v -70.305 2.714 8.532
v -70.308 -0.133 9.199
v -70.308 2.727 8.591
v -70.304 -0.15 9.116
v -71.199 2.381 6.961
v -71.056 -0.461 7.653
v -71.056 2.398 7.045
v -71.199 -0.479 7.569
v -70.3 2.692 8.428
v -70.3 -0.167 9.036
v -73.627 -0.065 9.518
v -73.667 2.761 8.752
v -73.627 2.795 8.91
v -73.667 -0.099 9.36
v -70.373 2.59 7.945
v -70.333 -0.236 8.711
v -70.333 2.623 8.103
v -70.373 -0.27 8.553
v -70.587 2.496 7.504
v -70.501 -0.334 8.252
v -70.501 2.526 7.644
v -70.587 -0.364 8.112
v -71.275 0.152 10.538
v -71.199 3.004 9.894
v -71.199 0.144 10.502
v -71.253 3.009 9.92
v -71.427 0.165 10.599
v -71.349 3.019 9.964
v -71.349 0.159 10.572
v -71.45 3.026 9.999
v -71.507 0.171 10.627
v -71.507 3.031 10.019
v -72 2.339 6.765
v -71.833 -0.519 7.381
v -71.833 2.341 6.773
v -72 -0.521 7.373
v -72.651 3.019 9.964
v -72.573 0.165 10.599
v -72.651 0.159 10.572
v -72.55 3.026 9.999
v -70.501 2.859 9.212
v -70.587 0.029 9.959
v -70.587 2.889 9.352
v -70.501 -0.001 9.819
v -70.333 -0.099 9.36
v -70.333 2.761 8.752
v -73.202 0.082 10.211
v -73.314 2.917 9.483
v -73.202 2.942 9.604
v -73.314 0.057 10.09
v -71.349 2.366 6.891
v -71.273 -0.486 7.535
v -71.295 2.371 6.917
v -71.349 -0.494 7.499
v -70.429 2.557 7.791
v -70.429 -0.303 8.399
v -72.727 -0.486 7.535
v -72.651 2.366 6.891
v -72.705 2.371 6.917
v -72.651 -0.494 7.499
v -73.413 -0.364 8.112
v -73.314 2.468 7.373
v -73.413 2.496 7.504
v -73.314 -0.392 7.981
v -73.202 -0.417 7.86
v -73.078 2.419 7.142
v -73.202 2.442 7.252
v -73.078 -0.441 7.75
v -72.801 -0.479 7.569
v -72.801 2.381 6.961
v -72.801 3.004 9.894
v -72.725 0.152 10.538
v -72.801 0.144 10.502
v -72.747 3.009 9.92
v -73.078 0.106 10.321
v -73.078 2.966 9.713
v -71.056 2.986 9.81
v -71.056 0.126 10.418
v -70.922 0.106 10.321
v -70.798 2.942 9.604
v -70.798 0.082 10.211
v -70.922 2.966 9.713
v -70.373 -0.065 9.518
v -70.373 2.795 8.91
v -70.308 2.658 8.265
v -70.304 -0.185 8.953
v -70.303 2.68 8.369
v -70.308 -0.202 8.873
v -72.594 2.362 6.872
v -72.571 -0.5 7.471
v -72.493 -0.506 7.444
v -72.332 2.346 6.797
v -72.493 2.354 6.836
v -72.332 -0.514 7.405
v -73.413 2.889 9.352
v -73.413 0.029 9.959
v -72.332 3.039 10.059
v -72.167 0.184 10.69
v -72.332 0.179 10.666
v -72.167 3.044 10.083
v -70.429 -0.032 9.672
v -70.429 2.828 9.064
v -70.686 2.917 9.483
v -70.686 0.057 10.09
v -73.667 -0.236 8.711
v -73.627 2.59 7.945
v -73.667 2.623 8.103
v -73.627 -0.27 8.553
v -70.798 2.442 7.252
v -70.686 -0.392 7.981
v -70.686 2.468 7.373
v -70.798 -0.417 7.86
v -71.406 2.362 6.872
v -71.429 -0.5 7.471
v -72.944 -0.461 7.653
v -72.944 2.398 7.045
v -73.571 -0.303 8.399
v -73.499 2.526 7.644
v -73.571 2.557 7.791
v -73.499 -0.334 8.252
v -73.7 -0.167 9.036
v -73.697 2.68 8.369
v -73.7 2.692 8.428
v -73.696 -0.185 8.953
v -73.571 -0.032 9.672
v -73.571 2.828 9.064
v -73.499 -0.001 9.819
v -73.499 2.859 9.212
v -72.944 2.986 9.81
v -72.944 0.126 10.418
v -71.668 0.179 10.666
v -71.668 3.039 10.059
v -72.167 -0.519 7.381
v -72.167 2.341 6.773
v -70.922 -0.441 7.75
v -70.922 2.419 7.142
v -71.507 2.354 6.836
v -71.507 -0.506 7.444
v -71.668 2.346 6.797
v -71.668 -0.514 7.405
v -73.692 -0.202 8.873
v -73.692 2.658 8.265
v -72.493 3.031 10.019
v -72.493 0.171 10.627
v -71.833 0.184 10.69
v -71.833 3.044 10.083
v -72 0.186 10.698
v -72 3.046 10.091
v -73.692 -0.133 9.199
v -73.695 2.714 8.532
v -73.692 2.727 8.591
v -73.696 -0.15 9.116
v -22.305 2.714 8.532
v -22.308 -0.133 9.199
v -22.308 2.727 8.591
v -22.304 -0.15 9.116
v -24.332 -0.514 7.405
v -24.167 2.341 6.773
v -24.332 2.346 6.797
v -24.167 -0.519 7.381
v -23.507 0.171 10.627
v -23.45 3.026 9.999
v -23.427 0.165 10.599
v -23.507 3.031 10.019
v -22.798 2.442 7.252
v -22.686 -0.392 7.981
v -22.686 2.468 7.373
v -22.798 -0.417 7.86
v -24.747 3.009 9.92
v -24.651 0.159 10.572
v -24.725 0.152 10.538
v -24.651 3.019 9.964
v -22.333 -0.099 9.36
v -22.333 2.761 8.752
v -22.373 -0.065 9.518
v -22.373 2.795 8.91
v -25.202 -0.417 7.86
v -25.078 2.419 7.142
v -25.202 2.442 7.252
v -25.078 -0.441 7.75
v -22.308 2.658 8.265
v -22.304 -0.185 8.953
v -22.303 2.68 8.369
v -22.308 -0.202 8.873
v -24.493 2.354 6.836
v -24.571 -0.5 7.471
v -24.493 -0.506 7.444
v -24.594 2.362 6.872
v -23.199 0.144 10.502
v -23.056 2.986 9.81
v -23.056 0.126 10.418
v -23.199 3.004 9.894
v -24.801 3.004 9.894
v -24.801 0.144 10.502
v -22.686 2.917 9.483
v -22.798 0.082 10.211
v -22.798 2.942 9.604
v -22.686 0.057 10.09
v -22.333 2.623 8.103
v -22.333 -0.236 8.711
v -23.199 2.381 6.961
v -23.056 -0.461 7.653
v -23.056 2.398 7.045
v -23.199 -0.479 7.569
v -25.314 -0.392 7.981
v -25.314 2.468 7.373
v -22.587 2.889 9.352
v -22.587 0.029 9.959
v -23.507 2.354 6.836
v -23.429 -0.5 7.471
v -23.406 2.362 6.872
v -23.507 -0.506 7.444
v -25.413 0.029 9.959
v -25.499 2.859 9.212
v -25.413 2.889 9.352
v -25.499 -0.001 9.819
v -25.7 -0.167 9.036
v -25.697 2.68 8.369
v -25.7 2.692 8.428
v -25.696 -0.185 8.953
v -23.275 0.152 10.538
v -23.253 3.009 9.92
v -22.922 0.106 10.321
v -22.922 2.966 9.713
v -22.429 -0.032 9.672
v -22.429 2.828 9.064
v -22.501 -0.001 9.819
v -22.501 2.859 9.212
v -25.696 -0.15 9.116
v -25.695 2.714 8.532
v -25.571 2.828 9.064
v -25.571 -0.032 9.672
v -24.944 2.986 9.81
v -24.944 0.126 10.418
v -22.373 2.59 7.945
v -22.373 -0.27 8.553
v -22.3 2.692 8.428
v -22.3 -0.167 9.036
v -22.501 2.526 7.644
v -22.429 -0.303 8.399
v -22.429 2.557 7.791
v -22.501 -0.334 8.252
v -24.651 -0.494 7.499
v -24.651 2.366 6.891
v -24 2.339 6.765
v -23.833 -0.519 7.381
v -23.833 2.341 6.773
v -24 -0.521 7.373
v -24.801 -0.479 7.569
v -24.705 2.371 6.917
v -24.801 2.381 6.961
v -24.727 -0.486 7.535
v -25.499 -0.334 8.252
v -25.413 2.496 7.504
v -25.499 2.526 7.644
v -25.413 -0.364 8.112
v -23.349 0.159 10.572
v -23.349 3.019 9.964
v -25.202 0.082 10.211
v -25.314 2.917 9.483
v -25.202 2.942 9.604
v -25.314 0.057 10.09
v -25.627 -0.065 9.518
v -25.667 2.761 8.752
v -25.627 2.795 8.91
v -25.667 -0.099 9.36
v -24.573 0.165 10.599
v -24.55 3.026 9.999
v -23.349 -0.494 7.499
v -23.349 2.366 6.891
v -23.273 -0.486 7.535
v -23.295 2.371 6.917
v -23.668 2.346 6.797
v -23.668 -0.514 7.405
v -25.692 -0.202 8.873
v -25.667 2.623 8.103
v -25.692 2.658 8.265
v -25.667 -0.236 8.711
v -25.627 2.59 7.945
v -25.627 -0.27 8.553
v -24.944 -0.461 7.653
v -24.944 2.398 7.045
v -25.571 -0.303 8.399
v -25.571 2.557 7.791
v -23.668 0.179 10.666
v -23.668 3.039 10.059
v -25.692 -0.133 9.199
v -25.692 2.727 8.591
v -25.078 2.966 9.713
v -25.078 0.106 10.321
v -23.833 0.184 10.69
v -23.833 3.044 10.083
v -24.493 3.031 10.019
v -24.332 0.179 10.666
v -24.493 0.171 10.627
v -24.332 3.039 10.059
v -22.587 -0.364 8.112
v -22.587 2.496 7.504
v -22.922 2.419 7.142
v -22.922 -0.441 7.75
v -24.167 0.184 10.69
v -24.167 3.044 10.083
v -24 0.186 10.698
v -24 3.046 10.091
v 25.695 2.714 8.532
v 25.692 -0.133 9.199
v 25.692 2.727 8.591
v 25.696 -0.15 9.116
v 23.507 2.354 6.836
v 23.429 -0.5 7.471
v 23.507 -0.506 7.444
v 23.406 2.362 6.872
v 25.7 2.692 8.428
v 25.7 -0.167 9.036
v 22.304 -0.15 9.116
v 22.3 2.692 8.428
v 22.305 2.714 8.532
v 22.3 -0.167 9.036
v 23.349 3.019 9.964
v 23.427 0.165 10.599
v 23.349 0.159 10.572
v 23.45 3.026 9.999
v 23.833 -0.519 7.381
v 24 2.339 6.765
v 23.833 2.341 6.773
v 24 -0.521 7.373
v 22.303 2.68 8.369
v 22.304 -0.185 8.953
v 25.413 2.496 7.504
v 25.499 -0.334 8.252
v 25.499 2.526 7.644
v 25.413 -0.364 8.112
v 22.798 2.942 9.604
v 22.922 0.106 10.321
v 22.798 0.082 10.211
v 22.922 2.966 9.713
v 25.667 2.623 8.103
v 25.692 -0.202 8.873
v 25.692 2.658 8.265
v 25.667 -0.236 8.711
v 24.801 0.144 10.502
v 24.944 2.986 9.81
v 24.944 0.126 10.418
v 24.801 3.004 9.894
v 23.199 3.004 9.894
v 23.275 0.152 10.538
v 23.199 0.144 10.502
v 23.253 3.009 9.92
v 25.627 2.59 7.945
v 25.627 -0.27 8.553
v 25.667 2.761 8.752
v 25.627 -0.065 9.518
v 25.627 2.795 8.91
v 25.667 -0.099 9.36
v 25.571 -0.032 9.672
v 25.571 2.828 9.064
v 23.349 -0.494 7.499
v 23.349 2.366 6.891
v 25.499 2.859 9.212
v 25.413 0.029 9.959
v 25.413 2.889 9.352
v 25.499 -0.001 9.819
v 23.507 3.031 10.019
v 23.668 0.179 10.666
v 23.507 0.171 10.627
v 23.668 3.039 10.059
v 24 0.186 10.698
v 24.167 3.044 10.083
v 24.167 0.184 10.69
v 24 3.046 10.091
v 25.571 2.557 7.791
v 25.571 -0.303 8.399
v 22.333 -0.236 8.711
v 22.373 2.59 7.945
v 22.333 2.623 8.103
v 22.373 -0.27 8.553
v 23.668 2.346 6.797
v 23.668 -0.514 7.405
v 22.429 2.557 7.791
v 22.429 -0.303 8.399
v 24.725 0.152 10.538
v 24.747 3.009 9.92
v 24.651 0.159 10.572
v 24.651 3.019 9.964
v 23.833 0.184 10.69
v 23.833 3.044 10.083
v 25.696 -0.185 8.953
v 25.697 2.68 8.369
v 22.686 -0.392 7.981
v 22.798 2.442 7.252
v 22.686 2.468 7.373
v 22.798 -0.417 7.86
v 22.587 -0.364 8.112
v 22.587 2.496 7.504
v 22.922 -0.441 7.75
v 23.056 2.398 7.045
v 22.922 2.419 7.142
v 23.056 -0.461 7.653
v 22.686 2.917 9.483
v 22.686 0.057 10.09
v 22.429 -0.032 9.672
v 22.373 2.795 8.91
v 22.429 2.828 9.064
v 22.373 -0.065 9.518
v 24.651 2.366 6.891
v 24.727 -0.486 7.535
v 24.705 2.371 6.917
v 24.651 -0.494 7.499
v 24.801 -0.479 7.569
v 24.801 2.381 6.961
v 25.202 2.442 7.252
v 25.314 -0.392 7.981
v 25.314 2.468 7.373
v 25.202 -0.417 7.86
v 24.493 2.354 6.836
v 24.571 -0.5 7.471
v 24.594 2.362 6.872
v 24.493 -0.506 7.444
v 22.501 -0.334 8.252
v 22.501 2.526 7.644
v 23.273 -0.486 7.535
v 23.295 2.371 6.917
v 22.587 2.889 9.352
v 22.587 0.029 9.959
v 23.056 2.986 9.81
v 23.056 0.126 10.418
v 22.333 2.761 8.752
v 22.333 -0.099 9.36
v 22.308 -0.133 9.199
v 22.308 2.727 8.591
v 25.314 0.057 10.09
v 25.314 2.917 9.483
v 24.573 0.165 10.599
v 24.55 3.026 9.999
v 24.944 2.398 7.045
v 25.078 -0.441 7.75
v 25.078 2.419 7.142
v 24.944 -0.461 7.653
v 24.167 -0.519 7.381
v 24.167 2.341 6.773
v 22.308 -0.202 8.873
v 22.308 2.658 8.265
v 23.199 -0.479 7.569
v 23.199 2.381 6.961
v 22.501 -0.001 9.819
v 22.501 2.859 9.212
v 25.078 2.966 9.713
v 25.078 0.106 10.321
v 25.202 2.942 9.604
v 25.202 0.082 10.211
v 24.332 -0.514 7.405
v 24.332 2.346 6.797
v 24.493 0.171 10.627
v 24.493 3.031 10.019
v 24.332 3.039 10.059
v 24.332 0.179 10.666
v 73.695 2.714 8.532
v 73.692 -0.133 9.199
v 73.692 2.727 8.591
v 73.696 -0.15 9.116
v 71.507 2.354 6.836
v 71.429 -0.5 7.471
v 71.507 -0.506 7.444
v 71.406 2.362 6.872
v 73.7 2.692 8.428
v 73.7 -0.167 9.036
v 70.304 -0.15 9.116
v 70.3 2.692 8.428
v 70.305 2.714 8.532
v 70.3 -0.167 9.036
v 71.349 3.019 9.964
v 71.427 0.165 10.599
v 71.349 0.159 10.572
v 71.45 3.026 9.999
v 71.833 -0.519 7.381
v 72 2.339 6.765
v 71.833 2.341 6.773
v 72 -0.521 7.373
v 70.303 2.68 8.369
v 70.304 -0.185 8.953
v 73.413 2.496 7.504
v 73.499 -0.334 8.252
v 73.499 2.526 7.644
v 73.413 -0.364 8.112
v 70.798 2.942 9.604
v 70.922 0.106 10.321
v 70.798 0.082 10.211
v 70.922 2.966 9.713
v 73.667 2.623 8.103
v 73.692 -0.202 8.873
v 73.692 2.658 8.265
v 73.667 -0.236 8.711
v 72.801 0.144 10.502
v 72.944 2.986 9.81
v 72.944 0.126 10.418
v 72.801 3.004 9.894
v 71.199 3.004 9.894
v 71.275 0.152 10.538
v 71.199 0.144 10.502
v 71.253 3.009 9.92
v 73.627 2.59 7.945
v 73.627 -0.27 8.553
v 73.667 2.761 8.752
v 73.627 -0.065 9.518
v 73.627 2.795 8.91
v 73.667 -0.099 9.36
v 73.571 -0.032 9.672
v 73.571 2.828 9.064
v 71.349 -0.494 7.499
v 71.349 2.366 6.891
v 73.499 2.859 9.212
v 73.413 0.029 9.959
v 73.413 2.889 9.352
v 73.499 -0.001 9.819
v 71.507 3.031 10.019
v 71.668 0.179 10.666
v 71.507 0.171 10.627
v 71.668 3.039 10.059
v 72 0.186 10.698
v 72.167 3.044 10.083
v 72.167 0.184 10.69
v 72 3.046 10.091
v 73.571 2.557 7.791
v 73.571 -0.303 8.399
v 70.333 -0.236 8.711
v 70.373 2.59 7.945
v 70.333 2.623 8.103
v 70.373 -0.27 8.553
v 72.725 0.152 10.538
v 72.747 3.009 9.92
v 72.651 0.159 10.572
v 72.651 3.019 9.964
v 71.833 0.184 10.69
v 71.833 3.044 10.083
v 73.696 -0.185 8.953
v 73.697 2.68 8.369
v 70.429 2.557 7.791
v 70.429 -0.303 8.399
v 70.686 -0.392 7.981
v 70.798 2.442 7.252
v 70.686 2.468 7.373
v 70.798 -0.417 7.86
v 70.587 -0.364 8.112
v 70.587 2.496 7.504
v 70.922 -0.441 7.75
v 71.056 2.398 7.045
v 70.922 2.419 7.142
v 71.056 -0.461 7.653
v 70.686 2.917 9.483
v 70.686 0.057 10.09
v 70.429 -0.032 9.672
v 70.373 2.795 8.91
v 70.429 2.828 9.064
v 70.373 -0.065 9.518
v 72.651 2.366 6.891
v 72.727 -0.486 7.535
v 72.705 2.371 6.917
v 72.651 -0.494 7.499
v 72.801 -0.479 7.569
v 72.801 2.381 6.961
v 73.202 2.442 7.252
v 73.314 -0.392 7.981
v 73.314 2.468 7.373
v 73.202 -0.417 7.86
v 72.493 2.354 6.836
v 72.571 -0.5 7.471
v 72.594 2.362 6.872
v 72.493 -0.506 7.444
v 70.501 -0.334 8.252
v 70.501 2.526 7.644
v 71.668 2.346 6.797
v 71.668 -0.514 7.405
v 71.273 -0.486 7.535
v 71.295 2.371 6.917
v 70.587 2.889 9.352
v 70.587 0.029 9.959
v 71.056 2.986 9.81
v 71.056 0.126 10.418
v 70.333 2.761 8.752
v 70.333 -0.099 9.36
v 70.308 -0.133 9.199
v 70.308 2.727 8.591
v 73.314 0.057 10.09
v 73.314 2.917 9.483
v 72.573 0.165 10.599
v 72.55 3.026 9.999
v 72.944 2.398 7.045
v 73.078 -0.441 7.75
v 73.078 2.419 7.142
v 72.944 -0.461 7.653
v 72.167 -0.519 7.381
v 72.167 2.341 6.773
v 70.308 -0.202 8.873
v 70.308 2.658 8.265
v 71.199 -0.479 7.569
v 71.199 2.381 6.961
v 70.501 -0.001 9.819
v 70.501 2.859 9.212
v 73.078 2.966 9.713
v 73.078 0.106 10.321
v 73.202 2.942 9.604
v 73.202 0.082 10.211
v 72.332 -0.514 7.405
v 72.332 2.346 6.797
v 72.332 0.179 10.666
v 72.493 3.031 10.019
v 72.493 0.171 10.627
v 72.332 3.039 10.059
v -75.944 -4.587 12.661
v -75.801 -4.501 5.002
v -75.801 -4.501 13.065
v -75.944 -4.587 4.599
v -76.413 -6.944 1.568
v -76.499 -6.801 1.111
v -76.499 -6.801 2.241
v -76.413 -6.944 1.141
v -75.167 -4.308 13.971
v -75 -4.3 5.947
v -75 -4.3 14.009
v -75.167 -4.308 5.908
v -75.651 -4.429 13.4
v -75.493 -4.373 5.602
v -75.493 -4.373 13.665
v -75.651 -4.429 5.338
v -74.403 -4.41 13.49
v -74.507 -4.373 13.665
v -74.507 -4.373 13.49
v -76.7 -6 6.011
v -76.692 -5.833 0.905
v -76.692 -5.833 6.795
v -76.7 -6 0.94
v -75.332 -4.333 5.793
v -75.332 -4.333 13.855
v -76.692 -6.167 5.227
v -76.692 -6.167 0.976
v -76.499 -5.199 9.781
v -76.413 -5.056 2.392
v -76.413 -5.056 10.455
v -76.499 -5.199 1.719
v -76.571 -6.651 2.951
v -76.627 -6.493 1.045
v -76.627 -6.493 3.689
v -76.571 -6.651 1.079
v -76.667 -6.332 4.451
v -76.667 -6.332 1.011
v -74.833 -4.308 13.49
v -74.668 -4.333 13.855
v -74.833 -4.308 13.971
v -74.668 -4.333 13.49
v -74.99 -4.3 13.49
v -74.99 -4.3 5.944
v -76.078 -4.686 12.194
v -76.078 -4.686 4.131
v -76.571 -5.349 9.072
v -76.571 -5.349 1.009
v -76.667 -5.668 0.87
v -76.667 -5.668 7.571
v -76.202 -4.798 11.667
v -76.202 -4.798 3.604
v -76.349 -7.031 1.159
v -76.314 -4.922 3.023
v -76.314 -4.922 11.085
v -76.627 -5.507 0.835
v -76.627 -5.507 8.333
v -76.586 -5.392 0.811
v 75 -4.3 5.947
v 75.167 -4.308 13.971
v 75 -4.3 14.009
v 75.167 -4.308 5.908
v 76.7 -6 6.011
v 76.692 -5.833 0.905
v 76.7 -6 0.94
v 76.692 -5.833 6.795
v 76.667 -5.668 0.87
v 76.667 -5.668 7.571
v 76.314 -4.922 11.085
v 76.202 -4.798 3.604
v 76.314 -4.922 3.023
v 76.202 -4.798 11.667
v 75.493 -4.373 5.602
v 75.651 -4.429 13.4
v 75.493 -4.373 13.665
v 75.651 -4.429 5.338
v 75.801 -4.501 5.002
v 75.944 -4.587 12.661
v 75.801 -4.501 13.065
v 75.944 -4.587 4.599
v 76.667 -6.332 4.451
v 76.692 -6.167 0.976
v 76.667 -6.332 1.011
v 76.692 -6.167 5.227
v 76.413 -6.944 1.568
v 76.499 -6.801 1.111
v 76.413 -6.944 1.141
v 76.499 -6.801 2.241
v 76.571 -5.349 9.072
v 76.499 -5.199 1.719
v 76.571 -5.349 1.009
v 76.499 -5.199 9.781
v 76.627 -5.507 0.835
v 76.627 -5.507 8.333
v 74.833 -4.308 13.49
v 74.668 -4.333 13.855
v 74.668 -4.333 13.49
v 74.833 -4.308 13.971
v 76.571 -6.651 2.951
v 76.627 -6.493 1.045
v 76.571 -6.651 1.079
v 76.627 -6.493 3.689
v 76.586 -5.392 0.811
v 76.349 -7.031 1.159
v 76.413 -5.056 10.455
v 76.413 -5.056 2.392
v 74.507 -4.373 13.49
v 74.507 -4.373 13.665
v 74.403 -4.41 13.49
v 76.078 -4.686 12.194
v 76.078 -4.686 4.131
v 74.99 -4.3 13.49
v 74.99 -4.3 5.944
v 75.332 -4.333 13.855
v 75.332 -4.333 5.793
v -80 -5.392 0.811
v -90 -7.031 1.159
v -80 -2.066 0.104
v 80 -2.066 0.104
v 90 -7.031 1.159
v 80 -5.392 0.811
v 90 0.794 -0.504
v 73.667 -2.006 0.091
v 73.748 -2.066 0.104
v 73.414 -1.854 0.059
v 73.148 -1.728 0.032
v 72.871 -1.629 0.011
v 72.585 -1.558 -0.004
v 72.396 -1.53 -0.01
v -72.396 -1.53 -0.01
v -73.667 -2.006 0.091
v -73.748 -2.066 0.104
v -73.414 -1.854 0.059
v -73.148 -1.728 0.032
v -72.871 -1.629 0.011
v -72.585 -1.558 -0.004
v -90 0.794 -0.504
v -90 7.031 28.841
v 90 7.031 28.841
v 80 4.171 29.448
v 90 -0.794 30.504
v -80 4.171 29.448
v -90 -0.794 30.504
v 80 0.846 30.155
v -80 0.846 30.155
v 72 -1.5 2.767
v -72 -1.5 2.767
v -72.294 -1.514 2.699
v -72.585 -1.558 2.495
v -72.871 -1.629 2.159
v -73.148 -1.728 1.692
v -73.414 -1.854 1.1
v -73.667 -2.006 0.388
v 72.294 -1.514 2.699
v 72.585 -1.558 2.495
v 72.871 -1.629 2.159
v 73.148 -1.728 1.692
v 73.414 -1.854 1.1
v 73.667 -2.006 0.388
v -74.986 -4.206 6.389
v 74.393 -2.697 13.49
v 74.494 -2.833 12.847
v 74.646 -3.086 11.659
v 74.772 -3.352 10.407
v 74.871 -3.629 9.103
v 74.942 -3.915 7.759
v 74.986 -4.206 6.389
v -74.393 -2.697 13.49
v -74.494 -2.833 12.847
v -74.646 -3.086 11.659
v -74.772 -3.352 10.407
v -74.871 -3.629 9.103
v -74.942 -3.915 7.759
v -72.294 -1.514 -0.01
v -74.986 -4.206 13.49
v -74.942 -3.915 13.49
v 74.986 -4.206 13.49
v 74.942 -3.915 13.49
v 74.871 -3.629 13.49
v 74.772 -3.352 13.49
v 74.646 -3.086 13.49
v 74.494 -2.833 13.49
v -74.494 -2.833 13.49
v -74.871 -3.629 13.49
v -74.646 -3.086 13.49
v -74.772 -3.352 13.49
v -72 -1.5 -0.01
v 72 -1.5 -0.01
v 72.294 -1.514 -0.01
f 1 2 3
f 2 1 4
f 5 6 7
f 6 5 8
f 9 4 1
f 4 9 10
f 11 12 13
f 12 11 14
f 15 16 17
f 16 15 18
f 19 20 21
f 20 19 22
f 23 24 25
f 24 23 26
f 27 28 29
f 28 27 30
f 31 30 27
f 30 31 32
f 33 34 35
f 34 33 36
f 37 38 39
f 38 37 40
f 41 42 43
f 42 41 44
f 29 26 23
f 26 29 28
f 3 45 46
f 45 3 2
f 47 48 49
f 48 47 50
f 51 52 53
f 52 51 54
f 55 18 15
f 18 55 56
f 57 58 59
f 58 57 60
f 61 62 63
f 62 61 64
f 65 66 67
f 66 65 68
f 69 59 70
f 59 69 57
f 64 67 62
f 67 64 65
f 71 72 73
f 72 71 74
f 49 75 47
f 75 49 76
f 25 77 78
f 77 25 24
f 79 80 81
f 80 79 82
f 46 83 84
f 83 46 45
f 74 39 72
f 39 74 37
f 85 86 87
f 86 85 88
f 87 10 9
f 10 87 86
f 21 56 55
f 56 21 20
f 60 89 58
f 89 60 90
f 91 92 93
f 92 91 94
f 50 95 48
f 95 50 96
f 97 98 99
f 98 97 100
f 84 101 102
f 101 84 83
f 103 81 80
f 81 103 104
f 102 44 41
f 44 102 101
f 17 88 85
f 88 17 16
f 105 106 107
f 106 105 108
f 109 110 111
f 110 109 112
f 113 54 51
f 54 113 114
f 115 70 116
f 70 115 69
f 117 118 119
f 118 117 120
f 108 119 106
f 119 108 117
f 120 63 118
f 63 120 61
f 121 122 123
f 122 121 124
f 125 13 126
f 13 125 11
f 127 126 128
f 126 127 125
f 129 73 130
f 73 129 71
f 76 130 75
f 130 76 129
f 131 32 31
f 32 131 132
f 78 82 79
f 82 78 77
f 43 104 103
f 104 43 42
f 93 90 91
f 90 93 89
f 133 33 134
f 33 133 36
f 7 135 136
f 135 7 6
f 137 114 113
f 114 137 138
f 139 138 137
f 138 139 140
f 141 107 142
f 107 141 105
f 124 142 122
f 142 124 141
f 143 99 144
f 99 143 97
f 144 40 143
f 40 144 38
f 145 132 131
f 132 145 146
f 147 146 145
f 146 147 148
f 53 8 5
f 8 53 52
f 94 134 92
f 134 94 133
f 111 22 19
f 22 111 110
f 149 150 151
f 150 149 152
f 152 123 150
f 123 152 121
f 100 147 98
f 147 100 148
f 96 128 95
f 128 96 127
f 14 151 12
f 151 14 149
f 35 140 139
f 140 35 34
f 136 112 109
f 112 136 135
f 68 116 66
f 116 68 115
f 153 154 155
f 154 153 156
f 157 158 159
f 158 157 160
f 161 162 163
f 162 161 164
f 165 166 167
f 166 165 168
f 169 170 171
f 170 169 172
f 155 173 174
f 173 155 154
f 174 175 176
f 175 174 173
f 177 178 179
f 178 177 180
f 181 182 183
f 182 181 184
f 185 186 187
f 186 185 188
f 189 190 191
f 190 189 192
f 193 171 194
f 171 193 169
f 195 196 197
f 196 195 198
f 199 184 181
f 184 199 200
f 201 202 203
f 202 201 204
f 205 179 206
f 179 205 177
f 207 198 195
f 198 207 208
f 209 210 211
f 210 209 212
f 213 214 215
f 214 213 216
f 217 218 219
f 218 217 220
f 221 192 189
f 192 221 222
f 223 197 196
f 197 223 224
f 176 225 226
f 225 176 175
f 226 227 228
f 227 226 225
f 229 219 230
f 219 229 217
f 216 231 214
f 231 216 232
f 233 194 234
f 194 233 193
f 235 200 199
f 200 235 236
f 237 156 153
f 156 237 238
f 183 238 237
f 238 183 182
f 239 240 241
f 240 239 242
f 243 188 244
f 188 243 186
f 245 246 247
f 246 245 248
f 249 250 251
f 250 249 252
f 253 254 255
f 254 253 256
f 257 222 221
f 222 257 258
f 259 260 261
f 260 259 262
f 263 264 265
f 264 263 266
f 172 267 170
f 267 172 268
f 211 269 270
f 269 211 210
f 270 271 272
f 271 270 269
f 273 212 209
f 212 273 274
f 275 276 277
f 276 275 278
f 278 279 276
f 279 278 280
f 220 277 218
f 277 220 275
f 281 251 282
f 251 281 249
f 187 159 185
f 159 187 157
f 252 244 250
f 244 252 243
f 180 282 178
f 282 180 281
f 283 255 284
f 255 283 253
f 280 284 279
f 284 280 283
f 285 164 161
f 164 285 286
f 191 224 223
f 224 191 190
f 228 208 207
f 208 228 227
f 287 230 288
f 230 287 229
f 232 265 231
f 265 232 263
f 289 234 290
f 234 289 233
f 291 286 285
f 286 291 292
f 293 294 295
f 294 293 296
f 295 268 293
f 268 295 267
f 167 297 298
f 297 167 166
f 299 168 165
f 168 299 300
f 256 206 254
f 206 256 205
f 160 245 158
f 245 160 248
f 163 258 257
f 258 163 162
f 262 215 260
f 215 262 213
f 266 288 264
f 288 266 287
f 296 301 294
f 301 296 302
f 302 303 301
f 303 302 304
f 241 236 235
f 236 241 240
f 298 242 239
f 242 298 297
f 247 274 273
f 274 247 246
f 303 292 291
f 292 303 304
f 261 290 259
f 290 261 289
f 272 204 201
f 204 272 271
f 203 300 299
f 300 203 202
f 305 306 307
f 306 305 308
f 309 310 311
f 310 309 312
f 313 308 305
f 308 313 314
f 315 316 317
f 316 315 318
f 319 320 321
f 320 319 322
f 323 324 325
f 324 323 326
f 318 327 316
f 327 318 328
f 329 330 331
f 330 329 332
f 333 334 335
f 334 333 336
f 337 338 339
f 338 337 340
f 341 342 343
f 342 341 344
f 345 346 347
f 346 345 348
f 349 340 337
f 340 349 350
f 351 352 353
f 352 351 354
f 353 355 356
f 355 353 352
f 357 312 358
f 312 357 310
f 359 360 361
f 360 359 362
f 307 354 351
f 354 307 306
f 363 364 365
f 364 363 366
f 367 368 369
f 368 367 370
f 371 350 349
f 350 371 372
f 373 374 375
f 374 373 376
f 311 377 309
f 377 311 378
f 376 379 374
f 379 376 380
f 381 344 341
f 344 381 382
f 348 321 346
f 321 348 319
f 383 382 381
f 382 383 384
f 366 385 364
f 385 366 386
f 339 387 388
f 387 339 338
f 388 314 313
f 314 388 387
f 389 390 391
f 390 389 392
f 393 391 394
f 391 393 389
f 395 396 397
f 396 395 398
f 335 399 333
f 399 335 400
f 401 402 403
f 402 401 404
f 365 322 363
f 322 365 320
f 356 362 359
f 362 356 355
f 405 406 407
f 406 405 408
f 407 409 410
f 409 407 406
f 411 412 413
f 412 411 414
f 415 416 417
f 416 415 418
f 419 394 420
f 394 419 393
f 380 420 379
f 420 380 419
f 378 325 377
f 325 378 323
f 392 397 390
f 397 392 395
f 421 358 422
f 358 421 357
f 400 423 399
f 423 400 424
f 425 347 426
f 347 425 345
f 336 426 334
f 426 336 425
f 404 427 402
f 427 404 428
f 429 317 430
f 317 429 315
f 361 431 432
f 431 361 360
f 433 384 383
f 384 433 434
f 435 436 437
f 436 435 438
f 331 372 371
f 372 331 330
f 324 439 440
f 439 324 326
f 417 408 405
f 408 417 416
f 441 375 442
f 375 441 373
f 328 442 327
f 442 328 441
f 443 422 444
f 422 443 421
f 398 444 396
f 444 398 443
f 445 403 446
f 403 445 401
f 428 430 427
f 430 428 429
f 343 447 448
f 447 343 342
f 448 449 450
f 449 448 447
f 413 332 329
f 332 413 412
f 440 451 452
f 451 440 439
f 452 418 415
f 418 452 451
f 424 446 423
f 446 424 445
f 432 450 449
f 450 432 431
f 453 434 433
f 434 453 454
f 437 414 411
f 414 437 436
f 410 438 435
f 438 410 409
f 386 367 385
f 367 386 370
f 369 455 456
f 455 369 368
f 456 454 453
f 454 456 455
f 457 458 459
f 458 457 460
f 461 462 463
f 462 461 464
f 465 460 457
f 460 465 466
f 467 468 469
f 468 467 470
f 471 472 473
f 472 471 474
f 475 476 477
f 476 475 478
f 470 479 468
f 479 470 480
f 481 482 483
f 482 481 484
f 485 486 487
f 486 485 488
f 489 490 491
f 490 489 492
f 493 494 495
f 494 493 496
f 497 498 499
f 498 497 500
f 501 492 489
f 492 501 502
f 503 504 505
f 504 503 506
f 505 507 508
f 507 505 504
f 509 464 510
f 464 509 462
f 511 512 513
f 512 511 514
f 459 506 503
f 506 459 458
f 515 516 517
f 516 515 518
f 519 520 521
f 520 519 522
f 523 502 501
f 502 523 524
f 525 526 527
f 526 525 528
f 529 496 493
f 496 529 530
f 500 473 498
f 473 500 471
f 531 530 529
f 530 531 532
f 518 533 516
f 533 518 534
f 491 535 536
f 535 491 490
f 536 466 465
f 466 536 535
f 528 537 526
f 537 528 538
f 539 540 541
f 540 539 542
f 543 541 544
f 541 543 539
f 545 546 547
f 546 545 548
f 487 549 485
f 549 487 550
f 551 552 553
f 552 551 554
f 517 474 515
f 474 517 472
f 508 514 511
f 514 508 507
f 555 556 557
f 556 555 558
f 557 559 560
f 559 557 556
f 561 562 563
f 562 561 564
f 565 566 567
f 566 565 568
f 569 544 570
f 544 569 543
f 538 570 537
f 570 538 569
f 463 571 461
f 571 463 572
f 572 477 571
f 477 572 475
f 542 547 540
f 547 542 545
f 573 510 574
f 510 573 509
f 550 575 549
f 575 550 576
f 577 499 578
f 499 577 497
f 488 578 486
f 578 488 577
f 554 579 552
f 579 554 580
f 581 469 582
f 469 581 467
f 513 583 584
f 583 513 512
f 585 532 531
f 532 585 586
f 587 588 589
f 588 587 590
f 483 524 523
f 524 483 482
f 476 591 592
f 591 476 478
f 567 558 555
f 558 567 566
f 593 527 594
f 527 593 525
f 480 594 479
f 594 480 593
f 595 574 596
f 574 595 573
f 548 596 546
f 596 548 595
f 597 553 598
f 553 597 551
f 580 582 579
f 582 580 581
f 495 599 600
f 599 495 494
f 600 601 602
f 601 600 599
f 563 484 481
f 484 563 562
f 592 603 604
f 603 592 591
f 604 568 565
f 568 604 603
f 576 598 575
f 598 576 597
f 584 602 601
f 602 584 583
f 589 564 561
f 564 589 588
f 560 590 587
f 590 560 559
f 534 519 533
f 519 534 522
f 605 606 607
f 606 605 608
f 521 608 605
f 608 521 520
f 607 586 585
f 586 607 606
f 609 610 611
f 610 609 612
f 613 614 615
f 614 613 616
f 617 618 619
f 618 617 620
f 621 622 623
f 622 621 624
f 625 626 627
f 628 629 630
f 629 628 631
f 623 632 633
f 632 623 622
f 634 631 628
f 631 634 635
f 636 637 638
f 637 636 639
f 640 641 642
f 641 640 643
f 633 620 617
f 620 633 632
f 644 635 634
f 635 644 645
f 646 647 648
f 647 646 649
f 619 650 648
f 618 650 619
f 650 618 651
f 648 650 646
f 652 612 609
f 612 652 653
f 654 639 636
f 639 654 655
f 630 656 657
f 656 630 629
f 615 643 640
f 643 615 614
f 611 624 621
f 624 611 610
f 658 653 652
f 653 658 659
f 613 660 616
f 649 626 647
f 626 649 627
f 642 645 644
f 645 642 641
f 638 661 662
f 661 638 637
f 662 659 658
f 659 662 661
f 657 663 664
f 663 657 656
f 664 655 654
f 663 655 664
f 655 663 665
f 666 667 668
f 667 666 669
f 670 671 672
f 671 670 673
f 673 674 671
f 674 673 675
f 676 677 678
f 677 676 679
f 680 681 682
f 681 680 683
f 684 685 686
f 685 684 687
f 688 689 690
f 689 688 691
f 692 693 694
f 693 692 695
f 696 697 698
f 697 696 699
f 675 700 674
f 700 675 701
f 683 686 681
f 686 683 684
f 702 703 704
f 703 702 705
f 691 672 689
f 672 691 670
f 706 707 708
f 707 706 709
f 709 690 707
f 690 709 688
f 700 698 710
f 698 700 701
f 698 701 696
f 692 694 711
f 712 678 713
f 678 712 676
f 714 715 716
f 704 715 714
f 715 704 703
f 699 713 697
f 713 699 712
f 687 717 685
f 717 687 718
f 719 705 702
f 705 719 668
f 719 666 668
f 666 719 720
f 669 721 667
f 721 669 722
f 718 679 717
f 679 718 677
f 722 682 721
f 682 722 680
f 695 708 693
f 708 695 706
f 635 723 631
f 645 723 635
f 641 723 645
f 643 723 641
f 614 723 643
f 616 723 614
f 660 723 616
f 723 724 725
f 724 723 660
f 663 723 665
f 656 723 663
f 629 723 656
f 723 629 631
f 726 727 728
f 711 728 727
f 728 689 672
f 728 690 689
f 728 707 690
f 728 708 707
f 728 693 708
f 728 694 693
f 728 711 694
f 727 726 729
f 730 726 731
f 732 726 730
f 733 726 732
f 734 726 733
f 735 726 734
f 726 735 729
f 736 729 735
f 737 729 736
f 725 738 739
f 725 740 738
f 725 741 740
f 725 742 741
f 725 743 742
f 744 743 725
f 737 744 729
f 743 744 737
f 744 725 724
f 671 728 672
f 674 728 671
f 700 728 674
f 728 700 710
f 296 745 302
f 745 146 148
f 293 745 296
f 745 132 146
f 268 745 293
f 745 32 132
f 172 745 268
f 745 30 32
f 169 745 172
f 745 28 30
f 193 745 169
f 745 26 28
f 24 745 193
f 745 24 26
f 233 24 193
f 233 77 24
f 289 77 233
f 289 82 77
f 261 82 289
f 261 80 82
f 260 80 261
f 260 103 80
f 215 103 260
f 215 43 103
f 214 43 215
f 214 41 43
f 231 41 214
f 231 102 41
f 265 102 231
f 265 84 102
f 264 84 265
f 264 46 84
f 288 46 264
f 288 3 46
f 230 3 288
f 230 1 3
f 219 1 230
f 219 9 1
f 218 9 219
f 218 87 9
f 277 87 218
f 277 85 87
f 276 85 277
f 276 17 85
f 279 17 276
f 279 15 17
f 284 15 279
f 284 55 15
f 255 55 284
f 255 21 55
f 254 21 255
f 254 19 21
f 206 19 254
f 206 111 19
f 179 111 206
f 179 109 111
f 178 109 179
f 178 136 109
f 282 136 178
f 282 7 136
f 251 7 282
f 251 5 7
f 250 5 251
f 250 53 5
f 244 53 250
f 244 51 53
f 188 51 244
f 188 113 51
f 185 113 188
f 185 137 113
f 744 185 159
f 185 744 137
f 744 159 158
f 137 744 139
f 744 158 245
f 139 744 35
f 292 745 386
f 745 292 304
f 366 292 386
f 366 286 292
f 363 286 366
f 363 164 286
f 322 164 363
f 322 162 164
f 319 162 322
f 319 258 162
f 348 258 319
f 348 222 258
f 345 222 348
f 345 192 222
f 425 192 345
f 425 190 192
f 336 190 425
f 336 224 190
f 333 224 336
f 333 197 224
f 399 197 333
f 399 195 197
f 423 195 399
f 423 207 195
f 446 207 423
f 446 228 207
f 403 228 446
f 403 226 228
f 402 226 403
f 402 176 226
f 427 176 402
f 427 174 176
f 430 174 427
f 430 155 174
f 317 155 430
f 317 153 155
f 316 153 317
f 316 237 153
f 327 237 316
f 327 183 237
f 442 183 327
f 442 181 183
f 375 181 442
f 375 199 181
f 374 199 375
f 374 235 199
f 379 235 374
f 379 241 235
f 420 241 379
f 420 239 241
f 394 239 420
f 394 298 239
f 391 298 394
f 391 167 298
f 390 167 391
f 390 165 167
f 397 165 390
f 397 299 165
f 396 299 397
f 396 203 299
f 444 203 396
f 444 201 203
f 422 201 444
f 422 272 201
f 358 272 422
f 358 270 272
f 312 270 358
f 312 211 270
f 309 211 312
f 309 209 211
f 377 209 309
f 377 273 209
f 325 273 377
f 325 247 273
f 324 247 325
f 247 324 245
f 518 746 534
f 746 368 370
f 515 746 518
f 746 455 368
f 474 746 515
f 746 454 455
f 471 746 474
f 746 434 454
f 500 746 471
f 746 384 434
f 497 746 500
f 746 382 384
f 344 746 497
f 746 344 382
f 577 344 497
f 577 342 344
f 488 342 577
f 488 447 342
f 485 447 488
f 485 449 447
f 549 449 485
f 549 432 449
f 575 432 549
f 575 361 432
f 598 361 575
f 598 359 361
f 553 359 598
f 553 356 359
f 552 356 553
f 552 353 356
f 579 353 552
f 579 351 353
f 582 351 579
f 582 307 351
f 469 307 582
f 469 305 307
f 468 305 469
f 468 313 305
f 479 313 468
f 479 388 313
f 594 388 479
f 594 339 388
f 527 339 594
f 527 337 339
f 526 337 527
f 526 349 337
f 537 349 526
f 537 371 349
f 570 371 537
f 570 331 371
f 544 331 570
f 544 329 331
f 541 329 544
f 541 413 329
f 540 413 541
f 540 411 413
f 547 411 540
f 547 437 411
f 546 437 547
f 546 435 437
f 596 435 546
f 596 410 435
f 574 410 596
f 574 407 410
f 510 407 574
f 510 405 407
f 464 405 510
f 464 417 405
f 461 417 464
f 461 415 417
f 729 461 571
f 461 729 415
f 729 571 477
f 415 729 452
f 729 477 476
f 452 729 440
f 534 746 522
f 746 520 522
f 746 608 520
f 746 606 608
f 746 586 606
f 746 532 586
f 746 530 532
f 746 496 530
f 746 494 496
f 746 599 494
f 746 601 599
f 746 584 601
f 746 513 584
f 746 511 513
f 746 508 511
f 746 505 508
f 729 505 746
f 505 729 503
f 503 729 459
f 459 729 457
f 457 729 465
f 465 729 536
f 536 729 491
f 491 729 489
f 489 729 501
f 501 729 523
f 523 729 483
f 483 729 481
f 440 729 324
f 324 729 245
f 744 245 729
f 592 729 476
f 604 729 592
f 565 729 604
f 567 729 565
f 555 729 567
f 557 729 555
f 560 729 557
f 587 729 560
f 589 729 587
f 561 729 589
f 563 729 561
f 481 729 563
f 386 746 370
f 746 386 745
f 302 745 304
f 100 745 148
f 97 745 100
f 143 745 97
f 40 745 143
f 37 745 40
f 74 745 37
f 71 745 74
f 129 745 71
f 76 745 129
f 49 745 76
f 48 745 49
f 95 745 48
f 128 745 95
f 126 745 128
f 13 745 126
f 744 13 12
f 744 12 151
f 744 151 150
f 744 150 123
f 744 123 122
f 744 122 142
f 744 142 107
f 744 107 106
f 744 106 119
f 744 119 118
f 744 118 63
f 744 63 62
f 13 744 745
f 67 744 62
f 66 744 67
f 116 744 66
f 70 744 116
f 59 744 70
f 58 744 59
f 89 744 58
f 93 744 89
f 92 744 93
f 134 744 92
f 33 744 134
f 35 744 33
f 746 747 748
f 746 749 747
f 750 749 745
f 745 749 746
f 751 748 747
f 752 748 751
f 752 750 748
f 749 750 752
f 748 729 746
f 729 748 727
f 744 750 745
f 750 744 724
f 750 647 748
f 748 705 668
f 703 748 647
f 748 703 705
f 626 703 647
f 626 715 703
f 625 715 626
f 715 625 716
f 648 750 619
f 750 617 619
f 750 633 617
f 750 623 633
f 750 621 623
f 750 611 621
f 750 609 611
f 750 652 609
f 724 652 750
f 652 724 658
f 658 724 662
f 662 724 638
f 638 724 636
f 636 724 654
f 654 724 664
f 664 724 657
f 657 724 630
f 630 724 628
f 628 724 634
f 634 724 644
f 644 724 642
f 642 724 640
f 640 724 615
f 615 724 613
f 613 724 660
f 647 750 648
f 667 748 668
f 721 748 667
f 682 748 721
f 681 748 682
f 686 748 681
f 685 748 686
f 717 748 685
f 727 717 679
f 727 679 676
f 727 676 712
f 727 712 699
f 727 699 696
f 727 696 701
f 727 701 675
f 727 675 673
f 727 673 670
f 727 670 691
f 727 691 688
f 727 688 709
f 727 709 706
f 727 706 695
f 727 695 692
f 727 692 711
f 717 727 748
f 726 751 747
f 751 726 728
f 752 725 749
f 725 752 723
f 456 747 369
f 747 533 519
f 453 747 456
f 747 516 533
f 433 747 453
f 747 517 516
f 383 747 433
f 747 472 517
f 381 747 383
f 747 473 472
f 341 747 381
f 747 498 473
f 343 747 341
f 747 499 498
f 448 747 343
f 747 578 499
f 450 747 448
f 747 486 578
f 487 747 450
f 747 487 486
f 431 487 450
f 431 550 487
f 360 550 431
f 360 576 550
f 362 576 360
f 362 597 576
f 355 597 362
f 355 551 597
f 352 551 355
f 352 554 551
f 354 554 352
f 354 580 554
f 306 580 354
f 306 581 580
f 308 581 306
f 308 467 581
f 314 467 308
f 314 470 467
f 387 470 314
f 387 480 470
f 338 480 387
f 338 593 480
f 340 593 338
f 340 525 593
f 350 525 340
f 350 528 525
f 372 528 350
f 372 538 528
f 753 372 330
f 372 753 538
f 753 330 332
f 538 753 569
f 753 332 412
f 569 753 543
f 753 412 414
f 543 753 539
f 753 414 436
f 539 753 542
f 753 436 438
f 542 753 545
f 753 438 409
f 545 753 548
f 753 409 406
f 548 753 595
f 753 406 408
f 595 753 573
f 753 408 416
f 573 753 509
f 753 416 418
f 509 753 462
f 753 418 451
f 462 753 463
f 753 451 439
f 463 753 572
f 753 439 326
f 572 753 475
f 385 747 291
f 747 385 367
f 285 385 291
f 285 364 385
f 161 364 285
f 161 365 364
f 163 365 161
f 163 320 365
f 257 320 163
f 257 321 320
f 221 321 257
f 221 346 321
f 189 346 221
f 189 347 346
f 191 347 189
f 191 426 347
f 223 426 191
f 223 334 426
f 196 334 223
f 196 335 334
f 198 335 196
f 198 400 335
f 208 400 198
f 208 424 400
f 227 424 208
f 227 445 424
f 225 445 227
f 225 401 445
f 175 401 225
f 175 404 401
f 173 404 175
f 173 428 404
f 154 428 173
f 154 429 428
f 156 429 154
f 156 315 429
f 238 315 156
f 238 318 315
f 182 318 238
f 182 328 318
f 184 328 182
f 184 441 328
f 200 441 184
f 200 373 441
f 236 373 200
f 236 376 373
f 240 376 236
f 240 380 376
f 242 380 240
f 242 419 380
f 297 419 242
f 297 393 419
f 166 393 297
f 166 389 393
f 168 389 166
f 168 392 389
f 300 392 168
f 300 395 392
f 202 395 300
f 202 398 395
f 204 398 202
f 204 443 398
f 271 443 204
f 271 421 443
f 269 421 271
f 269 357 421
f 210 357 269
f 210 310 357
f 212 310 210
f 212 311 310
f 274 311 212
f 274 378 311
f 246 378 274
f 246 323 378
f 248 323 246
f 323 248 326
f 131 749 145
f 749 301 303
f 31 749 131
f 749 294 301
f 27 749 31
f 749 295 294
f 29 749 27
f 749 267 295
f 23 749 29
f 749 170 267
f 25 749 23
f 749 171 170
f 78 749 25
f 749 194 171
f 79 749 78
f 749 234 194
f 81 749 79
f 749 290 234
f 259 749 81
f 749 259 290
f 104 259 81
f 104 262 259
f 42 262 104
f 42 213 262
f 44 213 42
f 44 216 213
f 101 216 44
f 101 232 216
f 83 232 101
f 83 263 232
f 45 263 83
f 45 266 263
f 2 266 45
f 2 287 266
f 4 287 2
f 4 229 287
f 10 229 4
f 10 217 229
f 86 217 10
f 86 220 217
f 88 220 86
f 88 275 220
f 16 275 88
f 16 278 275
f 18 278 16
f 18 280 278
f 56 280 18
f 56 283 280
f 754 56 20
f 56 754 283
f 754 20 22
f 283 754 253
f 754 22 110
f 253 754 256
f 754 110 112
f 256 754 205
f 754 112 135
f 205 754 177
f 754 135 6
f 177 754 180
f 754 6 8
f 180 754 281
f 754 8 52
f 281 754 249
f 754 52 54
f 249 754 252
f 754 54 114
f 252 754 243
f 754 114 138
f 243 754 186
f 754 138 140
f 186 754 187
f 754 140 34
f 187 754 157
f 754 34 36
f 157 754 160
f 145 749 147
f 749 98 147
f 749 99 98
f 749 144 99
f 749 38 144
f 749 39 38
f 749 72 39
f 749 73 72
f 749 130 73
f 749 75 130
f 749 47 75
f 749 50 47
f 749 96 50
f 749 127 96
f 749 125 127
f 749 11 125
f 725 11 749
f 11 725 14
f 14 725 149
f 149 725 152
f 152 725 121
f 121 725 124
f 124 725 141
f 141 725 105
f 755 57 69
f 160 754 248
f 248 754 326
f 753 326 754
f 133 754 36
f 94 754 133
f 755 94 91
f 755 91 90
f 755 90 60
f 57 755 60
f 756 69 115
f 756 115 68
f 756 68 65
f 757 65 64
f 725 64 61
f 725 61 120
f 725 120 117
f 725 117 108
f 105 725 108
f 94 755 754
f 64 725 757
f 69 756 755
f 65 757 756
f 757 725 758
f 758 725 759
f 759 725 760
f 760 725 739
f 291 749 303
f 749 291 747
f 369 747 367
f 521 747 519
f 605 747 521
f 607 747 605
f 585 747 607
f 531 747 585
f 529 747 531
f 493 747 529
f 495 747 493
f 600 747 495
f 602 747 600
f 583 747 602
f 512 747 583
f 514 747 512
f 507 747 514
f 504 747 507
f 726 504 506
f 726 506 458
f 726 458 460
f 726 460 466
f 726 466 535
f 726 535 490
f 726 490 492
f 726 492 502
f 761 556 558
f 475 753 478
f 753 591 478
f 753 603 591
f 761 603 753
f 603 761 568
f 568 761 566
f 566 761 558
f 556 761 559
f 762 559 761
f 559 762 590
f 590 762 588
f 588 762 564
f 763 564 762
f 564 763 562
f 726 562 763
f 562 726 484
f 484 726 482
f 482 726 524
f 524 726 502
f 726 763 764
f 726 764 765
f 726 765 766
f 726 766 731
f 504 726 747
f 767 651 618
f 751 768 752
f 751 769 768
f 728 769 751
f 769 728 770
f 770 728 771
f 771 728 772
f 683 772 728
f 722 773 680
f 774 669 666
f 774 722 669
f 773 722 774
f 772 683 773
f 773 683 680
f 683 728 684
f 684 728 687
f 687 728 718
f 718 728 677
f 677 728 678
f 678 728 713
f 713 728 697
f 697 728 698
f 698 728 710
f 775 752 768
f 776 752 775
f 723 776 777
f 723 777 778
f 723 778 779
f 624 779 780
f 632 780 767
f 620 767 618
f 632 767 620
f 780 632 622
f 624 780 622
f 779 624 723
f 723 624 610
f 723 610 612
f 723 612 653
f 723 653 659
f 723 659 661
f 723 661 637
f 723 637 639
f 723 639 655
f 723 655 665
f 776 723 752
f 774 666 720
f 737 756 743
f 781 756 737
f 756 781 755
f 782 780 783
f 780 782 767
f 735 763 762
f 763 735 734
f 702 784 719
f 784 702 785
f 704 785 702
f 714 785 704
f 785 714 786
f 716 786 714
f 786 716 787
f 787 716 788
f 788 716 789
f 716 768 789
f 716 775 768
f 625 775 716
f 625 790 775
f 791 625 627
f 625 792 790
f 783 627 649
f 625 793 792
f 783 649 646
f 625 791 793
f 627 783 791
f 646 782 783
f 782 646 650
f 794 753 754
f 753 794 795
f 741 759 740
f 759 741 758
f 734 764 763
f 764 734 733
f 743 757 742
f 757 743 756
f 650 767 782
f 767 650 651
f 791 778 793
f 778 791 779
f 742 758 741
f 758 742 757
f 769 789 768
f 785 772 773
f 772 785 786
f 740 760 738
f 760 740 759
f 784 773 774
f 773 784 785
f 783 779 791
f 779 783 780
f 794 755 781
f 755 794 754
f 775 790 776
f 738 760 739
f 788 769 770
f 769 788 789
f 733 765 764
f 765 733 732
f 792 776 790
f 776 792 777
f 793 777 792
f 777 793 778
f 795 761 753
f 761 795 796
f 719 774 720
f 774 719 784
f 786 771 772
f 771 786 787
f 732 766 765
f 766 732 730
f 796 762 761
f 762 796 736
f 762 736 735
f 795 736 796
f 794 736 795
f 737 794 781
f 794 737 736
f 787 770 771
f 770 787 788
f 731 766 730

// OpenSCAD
// file: params.scad
// ============================================================================
//  Робосумо 3 кг — спільні параметри
//  Усі розміри в міліметрах. Прав завжди тут, а не в окремих деталях.
//
//  Позначки:
//    ✅  підтверджено з даташита виробника
//    ❓  VERIFY — виміряй свою деталь штангенциркулем і виправ
// ============================================================================

// --- габарит робота ---------------------------------------------------------
CHASSIS_W       = 200;      // ✅ ліміт класу 200 x 200 мм
CHASSIS_L       = 200;
PLATE_T         = 6;        // товщина друкованого прототипу основи
ALLOY_T         = 4;        // товщина алюмінієвої бойової основи

// --- колеса -----------------------------------------------------------------
WHEEL_D         = 50;
WHEEL_W         = 15;
WHEEL_TRACK     = 150;      // між центрами коліс уздовж осі X
WHEELBASE       = 130;      // між центрами коліс уздовж осі Y

// --- мотор Pololu 37D (✅ усі з pololu.com/product/4745) --------------------
MOTOR_BODY_D    = 37;       // ✅ діаметр корпусу редуктора
MOTOR_SHAFT_D   = 6;        // ✅ D-подібний вал
MOTOR_SHAFT_L   = 16;       // ✅ довжина вала
MOTOR_HEX_PITCH = 15.5;     // ✅ суміжні отвори кріплення, правильний шестикутник
MOTOR_HEX_R     = MOTOR_HEX_PITCH / sqrt(3);   // ≈ 8.949 радіус описаного кола
MOTOR_SCREW_MAX = 3;        // ✅ Pololu: НЕ закручувати глибше 3 мм — дістане шестерні
MOTOR_TOTAL_L   = 57;       // ✅ 37Dx57L

// --- кріплення --------------------------------------------------------------
M3_CLEAR        = 3.4;
M3_TAP          = 2.9;
M2_CLEAR        = 2.2;
HEATSET_M3_D    = 4.0;      // отвір під термозакладну гайку M3
HEATSET_M3_H    = 5.7;

// --- плати (❓ виміряй свої) ------------------------------------------------
NANO_W          = 18;       // ✅ стандарт Arduino Nano
NANO_L          = 45;
NANO_HOLE_DX    = 15.24;    // ✅ 0.6 дюйма
NANO_HOLE_DY    = 43.18;    // ✅ 1.7 дюйма

BTS_W           = 25;       // ❓ VERIFY — плата BTS7960 / IBT-2
BTS_L           = 50;       // ❓ VERIFY
BTS_HOLE_DX     = 15;       // ❓ VERIFY
BTS_HOLE_DY     = 44;       // ❓ VERIFY
BTS_QTY         = 4;

QTR_W           = 12;       // ❓ VERIFY — Pololu QTR-8A
QTR_L           = 75;       // ❓ VERIFY
QTR_HOLE_DX     = 10;       // ❓ VERIFY
QTR_HOLE_DY     = 67;       // ❓ VERIFY

// --- акумулятор (❓ виміряй свій) -------------------------------------------
LIP_W           = 34;       // ❓ VERIFY — 6S 2200 мА·год
LIP_L           = 105;      // ❓ VERIFY
LIP_H           = 26;       // ❓ VERIFY

// --- клин -------------------------------------------------------------------
BLADE_W         = 190;
BLADE_T         = 3;
BLADE_ANGLE     = 12;       // ✅ наш вибір: 8–12° за «Blackbook»
BLADE_SCREWS    = 4;

// --- серво ------------------------------------------------------------------
SERVO_W         = 23;       // SG90
SERVO_L         = 32.5;
SERVO_H         = 29;

// --- магніти -----------------------------------------------------------------
MAG_W           = 20;       // 20 x 20 x 5 мм N52
MAG_D           = 5;

// --- якість друку -----------------------------------------------------------
$fn = 64;                   // гладкість круглих отворів
EPS = 0.01;                 // мікро-перекриття для булевих операцій

// ============================================================================
//  Допоміжні модулі
// ============================================================================

// Отвір під гвинт M3 з фаскою, щоб гвинт сідав рівно
module m3_hole(h = 20, head = true) {
    cylinder(d = M3_CLEAR, h = h + 2*EPS, center = true);
    if (head)
        translate([0, 0, h/2])
            cylinder(d1 = M3_CLEAR, d2 = 6.2, h = 1.6);
}

// Отвір під термозакладну гайку M3 (зверху вниз)
module heatset_hole() {
    cylinder(d = HEATSET_M3_D, h = HEATSET_M3_H, center = false);
    translate([0, 0, HEATSET_M3_H])
        cylinder(d = M3_CLEAR, h = 20);
}

// Шість отворів кріплення мотора 37D на правильному шестикутнику.
// Суміжні отвори рознесені рівно на MOTOR_HEX_PITCH.
module motor_mount_holes(depth = 20) {
    for (a = [0 : 60 : 359])
        rotate([0, 0, a])
            translate([MOTOR_HEX_R, 0, 0])
                cylinder(d = M3_CLEAR, h = depth + 2*EPS, center = true);
}

// Шестикутна кишеня під корпус мотора — щоб мотор сів у площину
module motor_body_pocket(depth = 2) {
    translate([0, 0, -depth/2])
        cylinder(d = MOTOR_BODY_D + 0.4, h = depth + EPS, center = true);
}

// Масив отворів по колу — для маточин і фланців
module bolt_circle(dia, n, hole_d = M3_CLEAR, depth = 20) {
    for (i = [0 : n-1])
        rotate([0, 0, i * 360 / n])
            translate([dia/2, 0, 0])
                cylinder(d = hole_d, h = depth + 2*EPS, center = true);
}

// Плита зі скругленими кутами
module rounded_plate(w, h, t, r = 8) {
    linear_extrude(height = t)
        offset(r = r) offset(delta = -r)
            square([w - 2*r, h - 2*r], center = true);
}
// main file
// ============================================================================
//  05 — Тримач клина
//  Тримає сталевий клин 3 мм під кутом 12° до підлоги.
//  Клин — головна зброя: він має заходити ПІД клин суперника.
// ============================================================================

include <params.scad>

HOLDER_W    = BLADE_W - 10;
HOLDER_H    = 30;
HOLDER_T    = 8;
SLOT_CLEAR  = 0.4;      // зазор під клин 3 мм

module blade_holder() {
    difference() {
        // корпус з нахилом під кутом клина; низ сидить на плиті (z = 0)
        translate([0, 0, HOLDER_H/2])
            rotate([-BLADE_ANGLE, 0, 0])
                cube([HOLDER_W, HOLDER_T, HOLDER_H], center = true);

        // паз під клин — той самий нахил, тож клин лягає в паз площиною
        translate([0, 0, HOLDER_H/2 + 3])
            rotate([-BLADE_ANGLE, 0, 0])
                cube([HOLDER_W - 20, BLADE_T + SLOT_CLEAR, HOLDER_H + 10],
                     center = true);

        // гвинти фіксації клина
        for (i = [0 : BLADE_SCREWS-1]) {
            x = -HOLDER_W/2 + 18
                + i * (HOLDER_W - 36) / max(1, BLADE_SCREWS - 1);
            translate([x, 0, HOLDER_H/2 - 6])
                rotate([-BLADE_ANGLE, 0, 0])
                    rotate([90, 0, 0])
                        cylinder(d = M3_CLEAR, h = HOLDER_T + 12, center = true);
        }

        // кріплення до основи: два отвори M3
        for (sx = [-1, 1])
            translate([sx * (HOLDER_W/2 - 15), -HOLDER_T/2 - 2, -EPS])
                cylinder(d = M3_CLEAR, h = HOLDER_H + 2*EPS);

        // полегшення знизу
        translate([0, -HOLDER_T/2 - 1, -EPS])
            linear_extrude(height = HOLDER_H * 0.45)
                offset(r = 3) offset(delta = -3)
                    square([HOLDER_W - 30, HOLDER_T - 1], center = true);
    }
}

blade_holder();
